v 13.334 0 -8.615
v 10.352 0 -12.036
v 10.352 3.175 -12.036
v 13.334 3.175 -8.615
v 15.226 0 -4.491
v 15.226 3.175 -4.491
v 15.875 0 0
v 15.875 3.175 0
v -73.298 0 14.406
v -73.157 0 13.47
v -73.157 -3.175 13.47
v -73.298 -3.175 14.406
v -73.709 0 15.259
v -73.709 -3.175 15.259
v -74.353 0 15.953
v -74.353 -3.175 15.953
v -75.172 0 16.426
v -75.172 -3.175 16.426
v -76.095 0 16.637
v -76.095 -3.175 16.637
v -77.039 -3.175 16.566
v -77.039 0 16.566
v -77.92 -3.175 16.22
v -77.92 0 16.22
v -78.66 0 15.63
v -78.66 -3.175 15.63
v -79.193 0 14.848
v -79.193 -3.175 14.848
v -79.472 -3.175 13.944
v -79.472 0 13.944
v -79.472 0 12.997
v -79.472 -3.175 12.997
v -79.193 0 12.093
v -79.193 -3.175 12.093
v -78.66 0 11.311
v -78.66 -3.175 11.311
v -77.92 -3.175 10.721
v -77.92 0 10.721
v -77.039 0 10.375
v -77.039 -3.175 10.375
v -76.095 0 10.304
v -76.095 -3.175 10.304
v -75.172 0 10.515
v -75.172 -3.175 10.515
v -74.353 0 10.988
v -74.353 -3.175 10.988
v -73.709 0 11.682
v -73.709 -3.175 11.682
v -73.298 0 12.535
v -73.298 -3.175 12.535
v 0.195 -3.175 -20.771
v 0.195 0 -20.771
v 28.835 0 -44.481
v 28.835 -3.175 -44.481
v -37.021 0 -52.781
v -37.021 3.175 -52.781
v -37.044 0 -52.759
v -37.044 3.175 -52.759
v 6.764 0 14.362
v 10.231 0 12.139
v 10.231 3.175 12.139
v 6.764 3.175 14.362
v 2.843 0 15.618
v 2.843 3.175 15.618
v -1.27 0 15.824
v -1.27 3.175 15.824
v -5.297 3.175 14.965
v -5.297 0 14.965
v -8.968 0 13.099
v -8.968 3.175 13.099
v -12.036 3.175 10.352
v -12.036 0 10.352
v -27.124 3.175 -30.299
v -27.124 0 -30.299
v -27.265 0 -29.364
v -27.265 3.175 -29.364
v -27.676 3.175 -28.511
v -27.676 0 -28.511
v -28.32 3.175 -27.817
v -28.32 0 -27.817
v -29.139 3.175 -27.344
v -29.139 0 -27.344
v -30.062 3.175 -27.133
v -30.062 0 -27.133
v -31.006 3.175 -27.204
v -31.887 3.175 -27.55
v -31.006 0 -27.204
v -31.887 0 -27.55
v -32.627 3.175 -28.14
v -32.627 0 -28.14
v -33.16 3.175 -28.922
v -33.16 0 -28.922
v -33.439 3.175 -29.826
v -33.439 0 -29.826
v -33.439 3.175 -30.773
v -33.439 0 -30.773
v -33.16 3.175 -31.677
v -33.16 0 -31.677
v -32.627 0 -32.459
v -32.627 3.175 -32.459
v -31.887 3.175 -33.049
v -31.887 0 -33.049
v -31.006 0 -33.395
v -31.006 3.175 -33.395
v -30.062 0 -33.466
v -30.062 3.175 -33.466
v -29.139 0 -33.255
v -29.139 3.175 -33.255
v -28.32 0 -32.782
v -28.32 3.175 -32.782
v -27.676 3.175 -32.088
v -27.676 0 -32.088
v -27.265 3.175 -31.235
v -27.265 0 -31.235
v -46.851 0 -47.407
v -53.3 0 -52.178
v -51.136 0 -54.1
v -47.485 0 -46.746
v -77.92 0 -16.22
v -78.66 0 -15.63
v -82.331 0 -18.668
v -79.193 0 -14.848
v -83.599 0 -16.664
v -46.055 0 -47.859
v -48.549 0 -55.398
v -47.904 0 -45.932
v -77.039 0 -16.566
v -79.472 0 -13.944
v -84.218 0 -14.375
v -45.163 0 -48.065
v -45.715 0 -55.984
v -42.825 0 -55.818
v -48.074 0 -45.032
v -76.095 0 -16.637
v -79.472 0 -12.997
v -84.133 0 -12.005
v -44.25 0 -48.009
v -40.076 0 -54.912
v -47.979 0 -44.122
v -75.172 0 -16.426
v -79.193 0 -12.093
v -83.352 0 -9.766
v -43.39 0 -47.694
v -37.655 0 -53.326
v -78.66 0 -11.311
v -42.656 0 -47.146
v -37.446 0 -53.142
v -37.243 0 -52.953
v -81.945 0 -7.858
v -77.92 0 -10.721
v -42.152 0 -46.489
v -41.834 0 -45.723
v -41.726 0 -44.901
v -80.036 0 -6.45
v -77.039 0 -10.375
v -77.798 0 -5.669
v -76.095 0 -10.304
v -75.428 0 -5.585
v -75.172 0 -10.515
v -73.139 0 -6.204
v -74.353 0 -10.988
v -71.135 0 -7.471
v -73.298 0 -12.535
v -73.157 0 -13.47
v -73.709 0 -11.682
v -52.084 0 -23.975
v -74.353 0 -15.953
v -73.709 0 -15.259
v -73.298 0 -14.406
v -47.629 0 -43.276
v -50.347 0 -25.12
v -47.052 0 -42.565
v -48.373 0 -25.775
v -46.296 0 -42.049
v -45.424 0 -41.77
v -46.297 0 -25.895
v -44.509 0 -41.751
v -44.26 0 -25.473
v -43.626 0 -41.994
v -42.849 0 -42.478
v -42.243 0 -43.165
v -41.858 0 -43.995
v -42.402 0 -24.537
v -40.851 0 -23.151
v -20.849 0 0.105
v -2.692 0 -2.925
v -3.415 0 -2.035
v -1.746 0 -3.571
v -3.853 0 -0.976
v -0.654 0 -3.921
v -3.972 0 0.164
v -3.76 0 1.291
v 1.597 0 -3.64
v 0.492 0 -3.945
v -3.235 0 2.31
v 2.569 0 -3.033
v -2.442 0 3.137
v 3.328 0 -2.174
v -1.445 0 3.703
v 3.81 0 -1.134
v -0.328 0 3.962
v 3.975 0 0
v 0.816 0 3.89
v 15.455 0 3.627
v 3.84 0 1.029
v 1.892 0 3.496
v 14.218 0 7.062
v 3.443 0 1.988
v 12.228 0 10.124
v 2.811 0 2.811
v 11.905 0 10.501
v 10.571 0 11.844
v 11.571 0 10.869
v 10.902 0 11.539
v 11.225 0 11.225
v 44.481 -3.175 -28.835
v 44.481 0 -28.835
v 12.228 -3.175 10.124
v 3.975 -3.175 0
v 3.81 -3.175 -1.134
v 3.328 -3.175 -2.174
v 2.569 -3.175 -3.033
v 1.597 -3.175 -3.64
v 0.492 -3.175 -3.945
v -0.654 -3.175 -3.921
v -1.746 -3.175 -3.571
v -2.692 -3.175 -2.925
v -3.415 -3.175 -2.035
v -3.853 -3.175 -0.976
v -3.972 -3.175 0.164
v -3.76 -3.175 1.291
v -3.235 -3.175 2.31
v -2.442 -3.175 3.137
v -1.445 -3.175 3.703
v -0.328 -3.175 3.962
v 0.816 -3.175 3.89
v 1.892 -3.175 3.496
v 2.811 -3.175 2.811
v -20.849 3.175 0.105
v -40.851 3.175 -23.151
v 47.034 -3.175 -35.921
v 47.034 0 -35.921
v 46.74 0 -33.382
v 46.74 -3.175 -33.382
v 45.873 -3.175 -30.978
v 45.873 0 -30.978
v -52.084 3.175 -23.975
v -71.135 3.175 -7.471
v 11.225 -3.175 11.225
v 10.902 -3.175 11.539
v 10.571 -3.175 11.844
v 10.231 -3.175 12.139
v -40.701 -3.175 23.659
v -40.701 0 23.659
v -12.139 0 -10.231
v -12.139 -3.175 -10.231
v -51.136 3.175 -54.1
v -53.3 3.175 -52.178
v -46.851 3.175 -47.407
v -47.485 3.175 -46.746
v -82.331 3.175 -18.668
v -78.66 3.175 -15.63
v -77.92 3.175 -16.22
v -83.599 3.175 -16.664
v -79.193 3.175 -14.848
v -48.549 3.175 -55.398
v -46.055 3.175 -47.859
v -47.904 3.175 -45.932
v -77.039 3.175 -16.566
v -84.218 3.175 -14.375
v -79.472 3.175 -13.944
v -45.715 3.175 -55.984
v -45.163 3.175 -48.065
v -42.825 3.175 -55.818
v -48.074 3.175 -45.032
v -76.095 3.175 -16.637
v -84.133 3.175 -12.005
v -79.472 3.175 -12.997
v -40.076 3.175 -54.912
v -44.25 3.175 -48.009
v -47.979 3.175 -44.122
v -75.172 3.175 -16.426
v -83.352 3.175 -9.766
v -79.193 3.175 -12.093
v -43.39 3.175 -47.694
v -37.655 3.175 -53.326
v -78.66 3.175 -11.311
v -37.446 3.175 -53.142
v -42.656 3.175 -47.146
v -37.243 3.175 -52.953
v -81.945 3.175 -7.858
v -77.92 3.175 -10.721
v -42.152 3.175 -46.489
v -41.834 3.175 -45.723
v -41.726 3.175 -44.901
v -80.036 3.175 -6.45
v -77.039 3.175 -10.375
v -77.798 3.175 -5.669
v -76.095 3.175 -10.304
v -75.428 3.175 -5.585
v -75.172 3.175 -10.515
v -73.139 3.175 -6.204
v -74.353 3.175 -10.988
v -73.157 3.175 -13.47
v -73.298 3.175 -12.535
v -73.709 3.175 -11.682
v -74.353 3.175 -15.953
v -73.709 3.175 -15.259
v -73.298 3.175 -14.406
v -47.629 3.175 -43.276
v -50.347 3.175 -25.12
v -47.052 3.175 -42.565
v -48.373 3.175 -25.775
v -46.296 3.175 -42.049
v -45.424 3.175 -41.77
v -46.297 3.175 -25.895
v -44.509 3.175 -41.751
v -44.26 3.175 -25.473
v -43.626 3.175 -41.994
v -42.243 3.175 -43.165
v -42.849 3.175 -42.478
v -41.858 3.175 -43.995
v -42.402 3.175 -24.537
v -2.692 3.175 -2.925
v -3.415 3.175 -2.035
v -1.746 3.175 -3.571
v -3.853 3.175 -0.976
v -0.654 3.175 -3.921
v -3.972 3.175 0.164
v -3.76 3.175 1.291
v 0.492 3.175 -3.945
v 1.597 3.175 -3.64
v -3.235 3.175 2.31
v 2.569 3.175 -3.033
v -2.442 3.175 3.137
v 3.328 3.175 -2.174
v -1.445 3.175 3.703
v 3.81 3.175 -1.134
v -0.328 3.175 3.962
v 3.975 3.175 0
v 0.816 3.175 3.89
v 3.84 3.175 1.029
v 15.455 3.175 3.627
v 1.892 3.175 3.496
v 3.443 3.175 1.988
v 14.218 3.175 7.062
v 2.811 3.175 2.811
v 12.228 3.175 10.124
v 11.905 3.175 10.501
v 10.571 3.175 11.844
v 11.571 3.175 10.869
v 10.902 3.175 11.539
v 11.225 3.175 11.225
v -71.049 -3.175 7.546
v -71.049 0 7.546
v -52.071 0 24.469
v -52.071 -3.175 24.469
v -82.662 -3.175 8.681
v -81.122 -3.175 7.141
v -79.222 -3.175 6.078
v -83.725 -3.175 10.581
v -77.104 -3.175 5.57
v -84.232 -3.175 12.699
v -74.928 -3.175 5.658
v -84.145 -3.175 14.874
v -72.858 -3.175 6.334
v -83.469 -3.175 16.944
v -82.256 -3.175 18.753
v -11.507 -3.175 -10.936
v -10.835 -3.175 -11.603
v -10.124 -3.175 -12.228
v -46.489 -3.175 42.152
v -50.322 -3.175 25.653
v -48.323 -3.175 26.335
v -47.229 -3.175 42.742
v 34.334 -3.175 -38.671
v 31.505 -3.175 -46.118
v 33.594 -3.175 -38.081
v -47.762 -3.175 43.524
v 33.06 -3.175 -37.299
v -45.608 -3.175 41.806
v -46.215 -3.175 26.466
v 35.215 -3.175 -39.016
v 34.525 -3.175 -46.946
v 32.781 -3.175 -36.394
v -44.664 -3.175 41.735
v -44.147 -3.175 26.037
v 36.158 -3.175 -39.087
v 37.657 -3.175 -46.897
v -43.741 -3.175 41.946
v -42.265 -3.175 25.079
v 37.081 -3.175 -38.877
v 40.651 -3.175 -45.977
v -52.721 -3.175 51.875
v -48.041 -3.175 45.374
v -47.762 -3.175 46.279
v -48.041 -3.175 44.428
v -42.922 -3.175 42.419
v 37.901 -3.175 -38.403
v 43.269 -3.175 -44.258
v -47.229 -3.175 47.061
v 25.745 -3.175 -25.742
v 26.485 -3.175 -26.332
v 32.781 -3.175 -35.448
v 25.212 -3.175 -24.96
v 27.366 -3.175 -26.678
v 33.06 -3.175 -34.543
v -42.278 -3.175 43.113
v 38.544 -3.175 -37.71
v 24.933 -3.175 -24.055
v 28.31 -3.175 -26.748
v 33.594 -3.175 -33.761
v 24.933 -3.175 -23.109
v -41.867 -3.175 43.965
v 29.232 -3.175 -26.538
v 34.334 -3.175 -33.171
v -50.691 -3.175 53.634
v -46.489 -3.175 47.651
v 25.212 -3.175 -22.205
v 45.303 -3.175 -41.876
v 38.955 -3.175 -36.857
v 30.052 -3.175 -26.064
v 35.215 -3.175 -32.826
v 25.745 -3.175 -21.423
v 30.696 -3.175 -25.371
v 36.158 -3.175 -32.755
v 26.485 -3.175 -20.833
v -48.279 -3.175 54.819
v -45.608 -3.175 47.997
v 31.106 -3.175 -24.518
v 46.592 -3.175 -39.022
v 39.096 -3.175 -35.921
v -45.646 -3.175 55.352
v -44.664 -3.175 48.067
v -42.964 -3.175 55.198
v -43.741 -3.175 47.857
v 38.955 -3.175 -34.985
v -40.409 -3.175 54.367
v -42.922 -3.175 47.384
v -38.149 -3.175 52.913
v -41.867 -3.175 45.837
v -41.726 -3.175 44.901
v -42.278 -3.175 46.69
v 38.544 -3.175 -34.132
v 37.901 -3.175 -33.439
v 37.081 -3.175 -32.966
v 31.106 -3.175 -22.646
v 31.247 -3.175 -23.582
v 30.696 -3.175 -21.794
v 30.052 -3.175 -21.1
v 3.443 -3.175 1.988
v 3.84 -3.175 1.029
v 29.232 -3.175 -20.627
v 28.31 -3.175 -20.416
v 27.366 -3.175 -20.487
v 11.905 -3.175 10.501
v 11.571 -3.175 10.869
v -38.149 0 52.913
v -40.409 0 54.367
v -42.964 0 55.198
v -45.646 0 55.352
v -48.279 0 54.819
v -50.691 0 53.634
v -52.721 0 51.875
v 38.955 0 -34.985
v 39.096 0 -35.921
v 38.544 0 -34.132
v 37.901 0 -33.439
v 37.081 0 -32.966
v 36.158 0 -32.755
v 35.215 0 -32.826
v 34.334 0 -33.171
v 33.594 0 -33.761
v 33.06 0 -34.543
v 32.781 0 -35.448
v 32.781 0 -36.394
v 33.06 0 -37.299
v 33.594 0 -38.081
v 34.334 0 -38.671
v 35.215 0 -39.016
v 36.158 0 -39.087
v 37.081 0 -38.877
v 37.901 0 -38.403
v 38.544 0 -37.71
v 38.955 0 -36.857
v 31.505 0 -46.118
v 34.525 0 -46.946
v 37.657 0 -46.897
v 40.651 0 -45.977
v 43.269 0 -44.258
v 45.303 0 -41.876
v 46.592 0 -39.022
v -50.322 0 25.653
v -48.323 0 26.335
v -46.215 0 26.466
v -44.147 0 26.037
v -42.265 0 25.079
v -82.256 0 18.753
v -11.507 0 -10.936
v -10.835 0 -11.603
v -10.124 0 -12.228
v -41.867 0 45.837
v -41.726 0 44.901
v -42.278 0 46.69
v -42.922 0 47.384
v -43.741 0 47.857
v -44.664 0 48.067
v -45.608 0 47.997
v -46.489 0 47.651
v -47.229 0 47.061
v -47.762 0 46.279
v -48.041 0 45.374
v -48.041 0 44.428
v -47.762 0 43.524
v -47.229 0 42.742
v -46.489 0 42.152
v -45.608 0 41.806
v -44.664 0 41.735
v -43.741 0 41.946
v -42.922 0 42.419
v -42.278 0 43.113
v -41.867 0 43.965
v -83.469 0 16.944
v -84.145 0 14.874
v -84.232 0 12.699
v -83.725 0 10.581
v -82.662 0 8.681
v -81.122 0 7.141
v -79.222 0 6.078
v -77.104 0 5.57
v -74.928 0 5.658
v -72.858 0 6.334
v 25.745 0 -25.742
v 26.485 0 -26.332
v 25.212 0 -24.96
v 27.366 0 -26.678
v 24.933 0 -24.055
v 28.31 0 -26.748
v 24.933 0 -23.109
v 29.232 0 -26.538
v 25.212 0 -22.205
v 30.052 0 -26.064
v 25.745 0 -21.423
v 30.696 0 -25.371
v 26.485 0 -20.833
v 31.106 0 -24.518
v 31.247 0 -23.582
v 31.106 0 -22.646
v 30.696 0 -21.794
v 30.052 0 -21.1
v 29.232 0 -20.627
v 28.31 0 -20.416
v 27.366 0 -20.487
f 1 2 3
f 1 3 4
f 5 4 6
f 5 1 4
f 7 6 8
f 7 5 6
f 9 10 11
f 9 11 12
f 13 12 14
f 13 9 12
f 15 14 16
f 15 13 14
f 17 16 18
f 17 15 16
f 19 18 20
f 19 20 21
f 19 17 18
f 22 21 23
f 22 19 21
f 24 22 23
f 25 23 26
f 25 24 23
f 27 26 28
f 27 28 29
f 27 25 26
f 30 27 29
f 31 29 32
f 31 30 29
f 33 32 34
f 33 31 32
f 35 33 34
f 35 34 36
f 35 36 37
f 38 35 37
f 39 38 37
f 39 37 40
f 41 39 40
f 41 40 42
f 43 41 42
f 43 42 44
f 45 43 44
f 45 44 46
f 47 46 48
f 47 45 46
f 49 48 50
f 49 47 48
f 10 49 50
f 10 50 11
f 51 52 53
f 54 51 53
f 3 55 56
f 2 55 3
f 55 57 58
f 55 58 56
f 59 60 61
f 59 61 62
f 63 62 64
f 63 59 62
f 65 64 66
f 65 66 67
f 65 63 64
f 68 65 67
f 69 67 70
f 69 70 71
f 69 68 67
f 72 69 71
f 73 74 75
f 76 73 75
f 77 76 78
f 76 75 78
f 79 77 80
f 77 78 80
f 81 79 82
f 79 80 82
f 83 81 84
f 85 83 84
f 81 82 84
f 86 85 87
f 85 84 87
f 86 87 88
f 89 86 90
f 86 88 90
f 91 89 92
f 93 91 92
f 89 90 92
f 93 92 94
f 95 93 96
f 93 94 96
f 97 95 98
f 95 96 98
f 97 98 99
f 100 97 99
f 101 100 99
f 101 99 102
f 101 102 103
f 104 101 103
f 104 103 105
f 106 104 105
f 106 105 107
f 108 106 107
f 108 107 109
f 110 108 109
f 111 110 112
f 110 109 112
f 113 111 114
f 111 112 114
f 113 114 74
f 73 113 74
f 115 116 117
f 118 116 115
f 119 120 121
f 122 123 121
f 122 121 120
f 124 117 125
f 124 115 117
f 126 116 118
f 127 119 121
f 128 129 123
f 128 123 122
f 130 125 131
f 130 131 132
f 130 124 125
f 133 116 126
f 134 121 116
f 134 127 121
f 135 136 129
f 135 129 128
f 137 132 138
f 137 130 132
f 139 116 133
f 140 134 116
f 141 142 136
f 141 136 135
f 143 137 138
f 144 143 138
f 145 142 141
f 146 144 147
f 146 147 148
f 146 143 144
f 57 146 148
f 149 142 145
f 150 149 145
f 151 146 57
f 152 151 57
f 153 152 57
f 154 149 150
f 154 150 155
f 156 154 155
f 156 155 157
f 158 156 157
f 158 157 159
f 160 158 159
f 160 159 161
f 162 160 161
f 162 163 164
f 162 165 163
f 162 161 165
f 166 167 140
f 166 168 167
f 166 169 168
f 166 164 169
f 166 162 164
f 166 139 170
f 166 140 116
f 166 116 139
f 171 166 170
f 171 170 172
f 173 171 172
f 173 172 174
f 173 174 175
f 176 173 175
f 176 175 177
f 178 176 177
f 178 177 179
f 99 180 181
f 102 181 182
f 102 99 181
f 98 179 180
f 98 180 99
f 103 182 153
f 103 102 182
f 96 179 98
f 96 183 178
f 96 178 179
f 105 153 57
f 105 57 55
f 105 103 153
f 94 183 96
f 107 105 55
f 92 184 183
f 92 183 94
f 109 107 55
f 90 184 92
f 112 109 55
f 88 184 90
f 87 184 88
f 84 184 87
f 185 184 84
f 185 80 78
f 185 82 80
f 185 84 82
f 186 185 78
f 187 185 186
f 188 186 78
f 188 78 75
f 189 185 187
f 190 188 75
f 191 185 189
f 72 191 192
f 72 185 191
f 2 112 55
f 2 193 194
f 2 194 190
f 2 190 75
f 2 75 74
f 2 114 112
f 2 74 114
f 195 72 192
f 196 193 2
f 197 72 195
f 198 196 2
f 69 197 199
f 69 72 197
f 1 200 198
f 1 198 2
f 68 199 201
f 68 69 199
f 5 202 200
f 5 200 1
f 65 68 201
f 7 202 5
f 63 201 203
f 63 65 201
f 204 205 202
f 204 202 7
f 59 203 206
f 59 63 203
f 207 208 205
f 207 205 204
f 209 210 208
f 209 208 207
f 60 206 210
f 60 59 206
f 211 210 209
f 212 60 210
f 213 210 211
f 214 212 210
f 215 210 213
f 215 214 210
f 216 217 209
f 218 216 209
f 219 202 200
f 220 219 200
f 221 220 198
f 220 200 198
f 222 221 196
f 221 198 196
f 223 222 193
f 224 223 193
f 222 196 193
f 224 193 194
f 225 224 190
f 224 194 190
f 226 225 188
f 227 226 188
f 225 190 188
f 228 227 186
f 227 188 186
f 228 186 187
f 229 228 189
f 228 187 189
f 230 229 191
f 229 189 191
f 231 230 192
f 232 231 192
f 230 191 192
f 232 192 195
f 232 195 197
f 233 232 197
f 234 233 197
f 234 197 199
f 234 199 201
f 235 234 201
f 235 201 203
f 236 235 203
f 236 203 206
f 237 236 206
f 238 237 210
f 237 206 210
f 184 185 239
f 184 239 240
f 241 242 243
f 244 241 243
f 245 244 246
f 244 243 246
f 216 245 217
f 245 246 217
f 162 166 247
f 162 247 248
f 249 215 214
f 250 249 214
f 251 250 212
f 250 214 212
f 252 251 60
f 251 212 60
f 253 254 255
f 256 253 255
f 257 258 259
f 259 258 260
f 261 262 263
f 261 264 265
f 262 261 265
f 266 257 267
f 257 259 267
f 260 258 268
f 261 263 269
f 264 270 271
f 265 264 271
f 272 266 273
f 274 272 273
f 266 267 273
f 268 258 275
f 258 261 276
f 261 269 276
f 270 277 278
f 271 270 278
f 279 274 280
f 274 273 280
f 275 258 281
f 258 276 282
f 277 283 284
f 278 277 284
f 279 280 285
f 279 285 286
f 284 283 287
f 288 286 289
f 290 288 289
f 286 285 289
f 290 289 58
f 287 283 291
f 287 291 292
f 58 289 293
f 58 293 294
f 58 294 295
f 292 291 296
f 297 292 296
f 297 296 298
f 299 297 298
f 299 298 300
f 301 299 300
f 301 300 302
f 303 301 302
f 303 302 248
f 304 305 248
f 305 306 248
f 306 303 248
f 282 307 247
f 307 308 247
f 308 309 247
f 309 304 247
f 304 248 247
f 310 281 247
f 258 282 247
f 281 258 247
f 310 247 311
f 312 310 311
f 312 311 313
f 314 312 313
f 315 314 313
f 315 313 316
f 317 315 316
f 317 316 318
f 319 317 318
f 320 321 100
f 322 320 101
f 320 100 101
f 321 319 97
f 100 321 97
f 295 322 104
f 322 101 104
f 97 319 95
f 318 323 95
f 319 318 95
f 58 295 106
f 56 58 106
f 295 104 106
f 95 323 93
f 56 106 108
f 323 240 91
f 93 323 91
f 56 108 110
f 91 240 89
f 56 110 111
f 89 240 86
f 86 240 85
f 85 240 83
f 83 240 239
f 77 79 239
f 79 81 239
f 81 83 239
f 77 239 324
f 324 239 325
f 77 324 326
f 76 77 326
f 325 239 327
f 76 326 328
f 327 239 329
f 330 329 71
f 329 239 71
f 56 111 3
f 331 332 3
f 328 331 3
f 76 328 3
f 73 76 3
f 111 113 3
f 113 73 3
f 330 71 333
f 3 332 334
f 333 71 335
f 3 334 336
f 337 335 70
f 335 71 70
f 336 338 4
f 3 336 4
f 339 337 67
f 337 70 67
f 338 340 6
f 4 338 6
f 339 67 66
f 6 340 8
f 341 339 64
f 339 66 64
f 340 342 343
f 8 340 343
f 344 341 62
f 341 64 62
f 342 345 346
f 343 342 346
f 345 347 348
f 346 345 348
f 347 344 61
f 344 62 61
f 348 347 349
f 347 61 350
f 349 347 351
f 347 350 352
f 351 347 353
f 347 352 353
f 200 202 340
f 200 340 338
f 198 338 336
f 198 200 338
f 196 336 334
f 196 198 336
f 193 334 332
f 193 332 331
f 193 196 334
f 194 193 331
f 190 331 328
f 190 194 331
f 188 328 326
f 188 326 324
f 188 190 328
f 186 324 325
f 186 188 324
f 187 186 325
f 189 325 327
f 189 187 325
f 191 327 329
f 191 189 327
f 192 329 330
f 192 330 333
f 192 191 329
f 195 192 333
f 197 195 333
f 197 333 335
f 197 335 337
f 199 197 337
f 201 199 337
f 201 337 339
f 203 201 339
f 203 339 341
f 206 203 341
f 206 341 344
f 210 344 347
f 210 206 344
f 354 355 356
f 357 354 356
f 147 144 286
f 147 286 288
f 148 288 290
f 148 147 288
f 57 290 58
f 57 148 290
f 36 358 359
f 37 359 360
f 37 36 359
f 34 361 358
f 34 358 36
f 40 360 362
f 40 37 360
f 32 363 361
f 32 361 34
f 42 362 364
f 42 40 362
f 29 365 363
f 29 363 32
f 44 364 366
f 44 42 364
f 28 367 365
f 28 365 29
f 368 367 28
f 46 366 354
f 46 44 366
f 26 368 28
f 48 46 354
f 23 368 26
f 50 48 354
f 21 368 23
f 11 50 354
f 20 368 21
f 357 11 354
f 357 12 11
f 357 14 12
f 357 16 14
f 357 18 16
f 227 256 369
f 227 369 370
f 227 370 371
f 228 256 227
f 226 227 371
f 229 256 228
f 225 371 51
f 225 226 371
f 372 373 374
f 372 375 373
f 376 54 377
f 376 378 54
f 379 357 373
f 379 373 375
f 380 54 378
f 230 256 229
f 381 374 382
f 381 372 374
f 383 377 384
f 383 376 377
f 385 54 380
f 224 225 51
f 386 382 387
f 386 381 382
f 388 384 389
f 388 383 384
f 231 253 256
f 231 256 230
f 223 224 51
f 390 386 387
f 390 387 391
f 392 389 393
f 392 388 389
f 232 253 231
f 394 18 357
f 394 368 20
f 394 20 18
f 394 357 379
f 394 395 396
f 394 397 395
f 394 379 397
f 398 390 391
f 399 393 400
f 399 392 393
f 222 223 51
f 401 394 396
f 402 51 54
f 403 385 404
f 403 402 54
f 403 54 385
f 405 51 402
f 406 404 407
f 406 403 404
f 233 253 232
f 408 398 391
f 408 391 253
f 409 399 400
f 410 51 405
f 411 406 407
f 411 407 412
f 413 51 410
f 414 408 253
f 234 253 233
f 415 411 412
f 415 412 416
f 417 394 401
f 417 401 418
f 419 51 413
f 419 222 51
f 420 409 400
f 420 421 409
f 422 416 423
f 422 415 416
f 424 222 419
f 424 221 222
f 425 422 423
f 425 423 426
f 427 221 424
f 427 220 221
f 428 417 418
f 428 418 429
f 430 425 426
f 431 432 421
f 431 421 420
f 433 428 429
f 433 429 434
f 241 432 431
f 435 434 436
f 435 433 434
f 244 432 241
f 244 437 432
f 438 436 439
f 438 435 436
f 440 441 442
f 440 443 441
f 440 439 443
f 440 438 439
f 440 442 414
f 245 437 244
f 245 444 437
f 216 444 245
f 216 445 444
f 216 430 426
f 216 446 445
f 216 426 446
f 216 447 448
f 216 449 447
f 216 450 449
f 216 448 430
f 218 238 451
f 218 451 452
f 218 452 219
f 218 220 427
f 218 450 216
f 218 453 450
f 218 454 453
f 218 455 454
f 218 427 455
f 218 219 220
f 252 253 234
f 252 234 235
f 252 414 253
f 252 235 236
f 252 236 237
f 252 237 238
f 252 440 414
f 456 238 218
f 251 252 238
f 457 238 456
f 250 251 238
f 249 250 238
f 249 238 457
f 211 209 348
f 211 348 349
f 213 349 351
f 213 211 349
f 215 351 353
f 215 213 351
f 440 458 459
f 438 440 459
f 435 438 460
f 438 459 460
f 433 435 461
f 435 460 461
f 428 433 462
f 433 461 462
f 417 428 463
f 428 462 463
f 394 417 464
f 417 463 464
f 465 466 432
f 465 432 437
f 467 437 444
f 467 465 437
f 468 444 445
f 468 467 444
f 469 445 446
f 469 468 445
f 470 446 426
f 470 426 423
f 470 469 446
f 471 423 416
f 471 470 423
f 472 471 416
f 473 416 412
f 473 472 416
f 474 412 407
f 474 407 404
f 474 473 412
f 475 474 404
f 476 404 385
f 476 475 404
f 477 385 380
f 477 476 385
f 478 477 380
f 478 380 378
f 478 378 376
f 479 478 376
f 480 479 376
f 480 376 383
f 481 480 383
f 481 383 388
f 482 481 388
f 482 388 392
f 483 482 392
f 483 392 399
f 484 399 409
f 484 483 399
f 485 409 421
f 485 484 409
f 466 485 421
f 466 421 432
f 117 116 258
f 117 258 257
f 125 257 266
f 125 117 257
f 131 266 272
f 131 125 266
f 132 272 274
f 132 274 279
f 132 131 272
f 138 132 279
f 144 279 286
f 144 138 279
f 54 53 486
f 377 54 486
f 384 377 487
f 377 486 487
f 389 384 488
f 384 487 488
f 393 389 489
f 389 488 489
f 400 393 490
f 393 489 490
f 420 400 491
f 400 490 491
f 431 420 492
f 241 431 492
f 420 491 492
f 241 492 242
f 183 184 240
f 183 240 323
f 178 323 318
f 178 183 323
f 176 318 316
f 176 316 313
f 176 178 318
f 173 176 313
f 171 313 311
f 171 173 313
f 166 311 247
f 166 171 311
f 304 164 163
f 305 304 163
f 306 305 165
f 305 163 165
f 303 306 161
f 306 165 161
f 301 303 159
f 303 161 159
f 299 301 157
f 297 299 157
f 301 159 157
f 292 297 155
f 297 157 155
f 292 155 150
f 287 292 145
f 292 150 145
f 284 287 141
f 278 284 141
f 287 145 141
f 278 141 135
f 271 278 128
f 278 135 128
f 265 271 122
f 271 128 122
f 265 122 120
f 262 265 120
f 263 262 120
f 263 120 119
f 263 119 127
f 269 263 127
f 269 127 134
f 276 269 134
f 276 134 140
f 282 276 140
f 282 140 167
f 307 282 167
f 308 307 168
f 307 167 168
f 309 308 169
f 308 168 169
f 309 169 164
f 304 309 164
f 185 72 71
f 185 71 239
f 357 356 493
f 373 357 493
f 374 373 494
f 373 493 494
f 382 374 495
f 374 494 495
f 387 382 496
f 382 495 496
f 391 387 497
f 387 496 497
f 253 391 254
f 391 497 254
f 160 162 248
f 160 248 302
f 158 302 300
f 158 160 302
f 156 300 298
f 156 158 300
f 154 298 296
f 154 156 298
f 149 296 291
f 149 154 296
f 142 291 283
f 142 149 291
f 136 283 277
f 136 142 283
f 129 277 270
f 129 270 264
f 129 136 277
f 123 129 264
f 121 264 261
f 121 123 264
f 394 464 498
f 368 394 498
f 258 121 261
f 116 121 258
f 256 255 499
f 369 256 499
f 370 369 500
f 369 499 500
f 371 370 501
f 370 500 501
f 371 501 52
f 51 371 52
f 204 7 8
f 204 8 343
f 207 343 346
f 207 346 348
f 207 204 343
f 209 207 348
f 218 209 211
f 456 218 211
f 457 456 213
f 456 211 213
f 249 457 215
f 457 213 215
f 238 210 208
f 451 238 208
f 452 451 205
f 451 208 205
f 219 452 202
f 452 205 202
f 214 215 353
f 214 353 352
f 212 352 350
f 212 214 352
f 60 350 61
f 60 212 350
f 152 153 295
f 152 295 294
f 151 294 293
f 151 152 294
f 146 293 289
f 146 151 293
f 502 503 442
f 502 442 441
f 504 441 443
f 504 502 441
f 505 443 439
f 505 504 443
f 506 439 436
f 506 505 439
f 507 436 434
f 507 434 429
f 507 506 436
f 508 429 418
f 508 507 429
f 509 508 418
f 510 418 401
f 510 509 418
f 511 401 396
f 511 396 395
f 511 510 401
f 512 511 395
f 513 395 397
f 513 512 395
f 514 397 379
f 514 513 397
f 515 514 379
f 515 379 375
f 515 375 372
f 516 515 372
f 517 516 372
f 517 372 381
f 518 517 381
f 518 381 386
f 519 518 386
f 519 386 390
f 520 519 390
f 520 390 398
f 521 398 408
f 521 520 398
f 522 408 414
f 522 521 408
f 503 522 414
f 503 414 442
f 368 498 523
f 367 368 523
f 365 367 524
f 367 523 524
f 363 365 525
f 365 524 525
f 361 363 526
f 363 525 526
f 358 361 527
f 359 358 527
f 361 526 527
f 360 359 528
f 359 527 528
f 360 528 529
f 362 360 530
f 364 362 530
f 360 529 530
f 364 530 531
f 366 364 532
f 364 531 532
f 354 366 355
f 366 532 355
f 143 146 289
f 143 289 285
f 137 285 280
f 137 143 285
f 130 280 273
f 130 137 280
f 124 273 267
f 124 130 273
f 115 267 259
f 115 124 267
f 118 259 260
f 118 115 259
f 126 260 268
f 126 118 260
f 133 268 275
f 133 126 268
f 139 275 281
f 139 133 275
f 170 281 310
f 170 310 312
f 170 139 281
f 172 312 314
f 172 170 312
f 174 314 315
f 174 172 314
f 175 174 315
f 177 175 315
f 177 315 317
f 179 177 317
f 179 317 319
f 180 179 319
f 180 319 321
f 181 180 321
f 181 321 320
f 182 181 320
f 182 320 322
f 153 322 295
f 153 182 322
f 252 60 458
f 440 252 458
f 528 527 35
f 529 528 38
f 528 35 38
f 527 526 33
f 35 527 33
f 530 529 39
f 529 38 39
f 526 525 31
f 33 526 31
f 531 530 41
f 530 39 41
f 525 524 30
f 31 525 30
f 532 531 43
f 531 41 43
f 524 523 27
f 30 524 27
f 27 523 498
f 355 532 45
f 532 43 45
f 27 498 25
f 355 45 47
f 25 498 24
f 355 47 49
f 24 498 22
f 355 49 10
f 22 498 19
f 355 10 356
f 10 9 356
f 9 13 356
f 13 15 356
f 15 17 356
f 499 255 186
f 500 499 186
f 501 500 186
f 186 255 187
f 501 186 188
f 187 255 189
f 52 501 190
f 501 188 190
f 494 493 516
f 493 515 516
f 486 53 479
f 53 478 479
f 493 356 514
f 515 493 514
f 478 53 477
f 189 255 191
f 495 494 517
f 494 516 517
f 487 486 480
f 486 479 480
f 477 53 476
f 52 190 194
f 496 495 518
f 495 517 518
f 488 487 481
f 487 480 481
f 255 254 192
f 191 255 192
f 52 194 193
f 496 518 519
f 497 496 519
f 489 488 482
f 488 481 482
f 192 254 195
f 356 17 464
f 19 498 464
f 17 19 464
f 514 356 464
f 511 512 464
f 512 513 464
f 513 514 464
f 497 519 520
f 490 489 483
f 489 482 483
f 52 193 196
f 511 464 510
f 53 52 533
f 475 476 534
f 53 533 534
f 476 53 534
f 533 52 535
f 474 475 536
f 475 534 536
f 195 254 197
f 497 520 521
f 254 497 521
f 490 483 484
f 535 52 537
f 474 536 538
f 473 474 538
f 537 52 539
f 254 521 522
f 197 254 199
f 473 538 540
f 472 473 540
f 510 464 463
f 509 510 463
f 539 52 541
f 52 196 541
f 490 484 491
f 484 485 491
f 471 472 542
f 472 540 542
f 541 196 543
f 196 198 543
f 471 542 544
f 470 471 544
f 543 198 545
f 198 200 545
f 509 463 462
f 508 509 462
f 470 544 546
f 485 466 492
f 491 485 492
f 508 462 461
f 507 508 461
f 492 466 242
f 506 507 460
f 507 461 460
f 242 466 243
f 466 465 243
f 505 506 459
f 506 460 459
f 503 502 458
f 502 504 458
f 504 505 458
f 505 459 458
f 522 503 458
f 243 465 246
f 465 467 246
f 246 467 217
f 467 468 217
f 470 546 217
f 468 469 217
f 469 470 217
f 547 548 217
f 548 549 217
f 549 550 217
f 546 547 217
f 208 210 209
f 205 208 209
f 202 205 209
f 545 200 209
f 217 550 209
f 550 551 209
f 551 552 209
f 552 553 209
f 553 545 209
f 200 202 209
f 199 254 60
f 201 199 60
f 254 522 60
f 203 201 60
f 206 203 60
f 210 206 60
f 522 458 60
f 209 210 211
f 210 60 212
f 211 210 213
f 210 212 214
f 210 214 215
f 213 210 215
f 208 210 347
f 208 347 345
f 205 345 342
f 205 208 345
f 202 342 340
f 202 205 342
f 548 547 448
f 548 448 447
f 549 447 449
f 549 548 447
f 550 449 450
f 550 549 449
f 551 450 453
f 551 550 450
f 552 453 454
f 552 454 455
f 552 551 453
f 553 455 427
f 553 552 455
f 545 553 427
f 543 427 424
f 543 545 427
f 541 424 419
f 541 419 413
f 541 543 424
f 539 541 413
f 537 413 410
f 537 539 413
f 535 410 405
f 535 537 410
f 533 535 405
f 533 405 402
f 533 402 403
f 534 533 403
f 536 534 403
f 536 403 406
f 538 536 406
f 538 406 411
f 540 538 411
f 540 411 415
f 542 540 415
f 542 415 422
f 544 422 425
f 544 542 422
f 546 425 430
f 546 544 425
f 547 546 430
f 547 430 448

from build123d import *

# Parameters (mm, degrees)
F0_R     = 3.175
F1_DEPTH = 3.175
F2_DEPTH = 3.175


with BuildPart() as f1:
    # F0 (on Front) → F1 (new body)
    with BuildSketch(Plane.XZ):
        with BuildLine():
            ThreePointArc((-34.4237806053, 44.9012806053), (-35.4006557474, 49.3189874266), (-38.1491222534, 52.9129198783))
            ThreePointArc((-38.1491222534, 52.9129198783), (-45.6460041086, 55.35228023), (-52.7212410911, 51.8745312283))
            ThreePointArc((-52.7212410911, 51.8745312283), (-48.6325250533, 35.1106819965), (-34.4237806053, 44.9012806053))
        make_face()
        with Locations((-44.9012806053, 44.9012806053)):
            Circle(F0_R, mode=Mode.SUBTRACT)
        with BuildLine():
            ThreePointArc((-68.3946770291, 13.4703841816), (-73.5054766898, 20.8875043398), (-82.2563895183, 18.7531498051))
            ThreePointArc((-82.2563895183, 18.7531498051), (-81.9448371048, 7.8577241059), (-71.0494114056, 7.5461716924))
            ThreePointArc((-71.0494114056, 7.5461716924), (-69.08870209, 10.2244671992), (-68.3946770291, 13.4703841816))
        make_face()
        with Locations((-76.3321770291, 13.4703841816)):
            Circle(F0_R, mode=Mode.SUBTRACT)
        with BuildLine():
            ThreePointArc((-12.0356034274, 10.3518054047), (-1.2700159776, 15.8241171765), (10.2305429575, 12.1388473833))
            Line((10.2305429575, 12.1388473833), (-38.1491222534, 52.9129198783))
            ThreePointArc((-38.1491222534, 52.9129198783), (-35.4006557474, 49.3189874266), (-34.4237806053, 44.9012806053))
            ThreePointArc((-34.4237806053, 44.9012806053), (-48.6325250533, 35.1106819965), (-52.7212410911, 51.8745312283))
            Line((-52.7212410911, 51.8745312283), (-82.2563895183, 18.7531498051))
            ThreePointArc((-82.2563895183, 18.7531498051), (-73.5054766898, 20.8875043398), (-68.3946770291, 13.4703841816))
            ThreePointArc((-68.3946770291, 13.4703841816), (-69.08870209, 10.2244671992), (-71.0494114056, 7.5461716924))
            Line((-71.0494114056, 7.5461716924), (-52.0712687873, 24.4694470818))
            ThreePointArc((-52.0712687873, 24.4694470818), (-46.2149635715, 26.465847689), (-40.7009159693, 23.6592117657))
            Line((-40.7009159693, 23.6592117657), (-20.8492251592, 0.1045826474))
            Line((-20.8492251592, 0.1045826474), (-12.0356034274, 10.3518054047))
        make_face()
        with BuildLine():
            ThreePointArc((12.2282550252, 10.1235074968), (11.7397208196, 10.6861864142), (11.2253201513, 11.2253201513))
            ThreePointArc((11.2253201513, 11.2253201513), (10.7376509739, 11.692667641), (10.2305429575, 12.1388473833))
            ThreePointArc((10.2305429575, 12.1388473833), (-1.2700159776, 15.8241171765), (-12.0356034274, 10.3518054047))
            ThreePointArc((-12.0356034274, 10.3518054047), (-15.874800283, 0.0796302322), (-12.1388473833, -10.2305429575))
            ThreePointArc((-12.1388473833, -10.2305429575), (-11.1759037477, -11.2745199641), (-10.1235074968, -12.2282550252))
            ThreePointArc((-10.1235074968, -12.2282550252), (0.1493607821, -15.87429735), (10.3518054047, -12.0356034274))
            ThreePointArc((10.3518054047, -12.0356034274), (14.4282801435, -6.6212051093), (15.875, 0))
            ThreePointArc((15.875, 0), (14.9355142785, 5.3801522504), (12.2282550252, 10.1235074968))
        make_face()
        with BuildLine():
            ThreePointArc((2.8108201659, 2.8108201659), (3.6725135297, 1.521204912), (3.9751, 0))
            ThreePointArc((3.9751, 0), (-3.6725135297, -1.521204912), (2.8108201659, 2.8108201659))
        make_face(mode=Mode.SUBTRACT)
        with BuildLine():
            Line((44.4808030019, -28.8345692365), (12.2282550252, 10.1235074968))
            ThreePointArc((12.2282550252, 10.1235074968), (14.9355142785, 5.3801522504), (15.875, 0))
            ThreePointArc((15.875, 0), (14.4282801435, -6.6212051093), (10.3518054047, -12.0356034274))
            Line((10.3518054047, -12.0356034274), (0.1954344954, -20.7710836138))
            Line((0.1954344954, -20.7710836138), (28.8345692365, -44.4808030019))
            ThreePointArc((28.8345692365, -44.4808030019), (28.0633003783, -28.0633003783), (44.4808030019, -28.8345692365))
        make_face()
        with Locations((28.0722806345, -23.5821525739)):
            Circle(F0_R, mode=Mode.SUBTRACT)
        with BuildLine():
            ThreePointArc((47.0335244843, -35.9210244843), (46.3758844792, -32.154917909), (44.4808030019, -28.8345692365))
            ThreePointArc((44.4808030019, -28.8345692365), (28.0633003783, -28.0633003783), (28.8345692365, -44.4808030019))
            ThreePointArc((28.8345692365, -44.4808030019), (40.650687385, -45.9767663811), (47.0335244843, -35.9210244843))
        make_face()
        with Locations((35.9210244843, -35.9210244843)):
            Circle(F0_R, mode=Mode.SUBTRACT)
        with BuildLine():
            ThreePointArc((-12.1388473833, -10.2305429575), (-15.874800283, 0.0796302322), (-12.0356034274, 10.3518054047))
            Line((-12.0356034274, 10.3518054047), (-20.8492251592, 0.1045826474))
            Line((-20.8492251592, 0.1045826474), (-12.1388473833, -10.2305429575))
        make_face()
        with BuildLine():
            Line((0.1954344954, -20.7710836138), (10.3518054047, -12.0356034274))
            ThreePointArc((10.3518054047, -12.0356034274), (0.1493607821, -15.87429735), (-10.1235074968, -12.2282550252))
            Line((-10.1235074968, -12.2282550252), (0.1954344954, -20.7710836138))
        make_face()
    extrude(amount=F1_DEPTH)


with BuildPart() as f2:
    # F0 (on Front) → F2 (new body)
    with BuildSketch(Plane.XZ):
        with BuildLine():
            ThreePointArc((-10.1235074968, -12.2282550252), (-11.1759037477, -11.2745199641), (-12.1388473833, -10.2305429575))
            Line((-12.1388473833, -10.2305429575), (-20.8492251592, 0.1045826474))
            Line((-20.8492251592, 0.1045826474), (-40.8511612346, -23.1508168672))
            ThreePointArc((-40.8511612346, -23.1508168672), (-46.2965222838, -25.8954961667), (-52.0843267669, -23.9754595323))
            Line((-52.0843267669, -23.9754595323), (-71.1347575644, -7.4711561347))
            ThreePointArc((-71.1347575644, -7.4711561347), (-69.1121208226, -10.1727039932), (-68.3946770291, -13.4703841816))
            ThreePointArc((-68.3946770291, -13.4703841816), (-73.5586383483, -20.9075469092), (-82.331405076, -18.6678036462))
            Line((-82.331405076, -18.6678036462), (-53.300199871, -52.1776678558))
            ThreePointArc((-53.300199871, -52.1776678558), (-48.7842347585, -34.4892527868), (-33.7887806053, -44.9012806053))
            ThreePointArc((-33.7887806053, -44.9012806053), (-34.6346693003, -49.1538502475), (-37.0435564994, -52.7590047113))
            Line((-37.0435564994, -52.7590047113), (-37.0213629774, -52.7811982333))
            Line((-37.0213629774, -52.7811982333), (0.1954344954, -20.7710836138))
            Line((0.1954344954, -20.7710836138), (-10.1235074968, -12.2282550252))
        make_face()
        with Locations((-30.2993841525, -30.2993841525)):
            Circle(F0_R, mode=Mode.SUBTRACT)
        with BuildLine():
            ThreePointArc((-53.300199871, -52.1776678558), (-45.7148756595, -55.9839571475), (-37.655016822, -53.3262030046))
            ThreePointArc((-37.655016822, -53.3262030046), (-37.3439635539, -53.04834236), (-37.0435564994, -52.7590047113))
            ThreePointArc((-37.0435564994, -52.7590047113), (-34.6346693003, -49.1538502475), (-33.7887806053, -44.9012806053))
            ThreePointArc((-33.7887806053, -44.9012806053), (-48.7842347585, -34.4892527868), (-53.300199871, -52.1776678558))
        make_face()
        with BuildLine():
            ThreePointArc((-41.7262806053, -44.9012806053), (-41.9679630896, -46.1163005031), (-42.6562165751, -47.1463446356))
            ThreePointArc((-42.6562165751, -47.1463446356), (-47.8345981211, -43.6862607076), (-41.7262806053, -44.9012806053))
        make_face(mode=Mode.SUBTRACT)
        with BuildLine():
            ThreePointArc((-68.3946770291, -13.4703841816), (-69.1121208226, -10.1727039932), (-71.1347575644, -7.4711561347))
            ThreePointArc((-71.1347575644, -7.4711561347), (-81.9448371048, -7.8577241059), (-82.331405076, -18.6678036462))
            ThreePointArc((-82.331405076, -18.6678036462), (-73.5586383483, -20.9075469092), (-68.3946770291, -13.4703841816))
        make_face()
        with Locations((-76.3321770291, -13.4703841816)):
            Circle(F0_R, mode=Mode.SUBTRACT)
        with BuildLine():
            ThreePointArc((12.2282550252, 10.1235074968), (11.7397208196, 10.6861864142), (11.2253201513, 11.2253201513))
            ThreePointArc((11.2253201513, 11.2253201513), (10.7376509739, 11.692667641), (10.2305429575, 12.1388473833))
            ThreePointArc((10.2305429575, 12.1388473833), (-1.2700159776, 15.8241171765), (-12.0356034274, 10.3518054047))
            ThreePointArc((-12.0356034274, 10.3518054047), (-15.874800283, 0.0796302322), (-12.1388473833, -10.2305429575))
            ThreePointArc((-12.1388473833, -10.2305429575), (-11.1759037477, -11.2745199641), (-10.1235074968, -12.2282550252))
            ThreePointArc((-10.1235074968, -12.2282550252), (0.1493607821, -15.87429735), (10.3518054047, -12.0356034274))
            ThreePointArc((10.3518054047, -12.0356034274), (14.4282801435, -6.6212051093), (15.875, 0))
            ThreePointArc((15.875, 0), (14.9355142785, 5.3801522504), (12.2282550252, 10.1235074968))
        make_face()
        with BuildLine():
            ThreePointArc((2.8108201659, 2.8108201659), (3.6725135297, 1.521204912), (3.9751, 0))
            ThreePointArc((3.9751, 0), (-3.6725135297, -1.521204912), (2.8108201659, 2.8108201659))
        make_face(mode=Mode.SUBTRACT)
        with BuildLine():
            Line((0.1954344954, -20.7710836138), (10.3518054047, -12.0356034274))
            ThreePointArc((10.3518054047, -12.0356034274), (0.1493607821, -15.87429735), (-10.1235074968, -12.2282550252))
            Line((-10.1235074968, -12.2282550252), (0.1954344954, -20.7710836138))
        make_face()
        with BuildLine():
            ThreePointArc((-12.1388473833, -10.2305429575), (-15.874800283, 0.0796302322), (-12.0356034274, 10.3518054047))
            Line((-12.0356034274, 10.3518054047), (-20.8492251592, 0.1045826474))
            Line((-20.8492251592, 0.1045826474), (-12.1388473833, -10.2305429575))
        make_face()
    extrude(amount=-F2_DEPTH)


solid = Compound([f1.part, f2.part])
